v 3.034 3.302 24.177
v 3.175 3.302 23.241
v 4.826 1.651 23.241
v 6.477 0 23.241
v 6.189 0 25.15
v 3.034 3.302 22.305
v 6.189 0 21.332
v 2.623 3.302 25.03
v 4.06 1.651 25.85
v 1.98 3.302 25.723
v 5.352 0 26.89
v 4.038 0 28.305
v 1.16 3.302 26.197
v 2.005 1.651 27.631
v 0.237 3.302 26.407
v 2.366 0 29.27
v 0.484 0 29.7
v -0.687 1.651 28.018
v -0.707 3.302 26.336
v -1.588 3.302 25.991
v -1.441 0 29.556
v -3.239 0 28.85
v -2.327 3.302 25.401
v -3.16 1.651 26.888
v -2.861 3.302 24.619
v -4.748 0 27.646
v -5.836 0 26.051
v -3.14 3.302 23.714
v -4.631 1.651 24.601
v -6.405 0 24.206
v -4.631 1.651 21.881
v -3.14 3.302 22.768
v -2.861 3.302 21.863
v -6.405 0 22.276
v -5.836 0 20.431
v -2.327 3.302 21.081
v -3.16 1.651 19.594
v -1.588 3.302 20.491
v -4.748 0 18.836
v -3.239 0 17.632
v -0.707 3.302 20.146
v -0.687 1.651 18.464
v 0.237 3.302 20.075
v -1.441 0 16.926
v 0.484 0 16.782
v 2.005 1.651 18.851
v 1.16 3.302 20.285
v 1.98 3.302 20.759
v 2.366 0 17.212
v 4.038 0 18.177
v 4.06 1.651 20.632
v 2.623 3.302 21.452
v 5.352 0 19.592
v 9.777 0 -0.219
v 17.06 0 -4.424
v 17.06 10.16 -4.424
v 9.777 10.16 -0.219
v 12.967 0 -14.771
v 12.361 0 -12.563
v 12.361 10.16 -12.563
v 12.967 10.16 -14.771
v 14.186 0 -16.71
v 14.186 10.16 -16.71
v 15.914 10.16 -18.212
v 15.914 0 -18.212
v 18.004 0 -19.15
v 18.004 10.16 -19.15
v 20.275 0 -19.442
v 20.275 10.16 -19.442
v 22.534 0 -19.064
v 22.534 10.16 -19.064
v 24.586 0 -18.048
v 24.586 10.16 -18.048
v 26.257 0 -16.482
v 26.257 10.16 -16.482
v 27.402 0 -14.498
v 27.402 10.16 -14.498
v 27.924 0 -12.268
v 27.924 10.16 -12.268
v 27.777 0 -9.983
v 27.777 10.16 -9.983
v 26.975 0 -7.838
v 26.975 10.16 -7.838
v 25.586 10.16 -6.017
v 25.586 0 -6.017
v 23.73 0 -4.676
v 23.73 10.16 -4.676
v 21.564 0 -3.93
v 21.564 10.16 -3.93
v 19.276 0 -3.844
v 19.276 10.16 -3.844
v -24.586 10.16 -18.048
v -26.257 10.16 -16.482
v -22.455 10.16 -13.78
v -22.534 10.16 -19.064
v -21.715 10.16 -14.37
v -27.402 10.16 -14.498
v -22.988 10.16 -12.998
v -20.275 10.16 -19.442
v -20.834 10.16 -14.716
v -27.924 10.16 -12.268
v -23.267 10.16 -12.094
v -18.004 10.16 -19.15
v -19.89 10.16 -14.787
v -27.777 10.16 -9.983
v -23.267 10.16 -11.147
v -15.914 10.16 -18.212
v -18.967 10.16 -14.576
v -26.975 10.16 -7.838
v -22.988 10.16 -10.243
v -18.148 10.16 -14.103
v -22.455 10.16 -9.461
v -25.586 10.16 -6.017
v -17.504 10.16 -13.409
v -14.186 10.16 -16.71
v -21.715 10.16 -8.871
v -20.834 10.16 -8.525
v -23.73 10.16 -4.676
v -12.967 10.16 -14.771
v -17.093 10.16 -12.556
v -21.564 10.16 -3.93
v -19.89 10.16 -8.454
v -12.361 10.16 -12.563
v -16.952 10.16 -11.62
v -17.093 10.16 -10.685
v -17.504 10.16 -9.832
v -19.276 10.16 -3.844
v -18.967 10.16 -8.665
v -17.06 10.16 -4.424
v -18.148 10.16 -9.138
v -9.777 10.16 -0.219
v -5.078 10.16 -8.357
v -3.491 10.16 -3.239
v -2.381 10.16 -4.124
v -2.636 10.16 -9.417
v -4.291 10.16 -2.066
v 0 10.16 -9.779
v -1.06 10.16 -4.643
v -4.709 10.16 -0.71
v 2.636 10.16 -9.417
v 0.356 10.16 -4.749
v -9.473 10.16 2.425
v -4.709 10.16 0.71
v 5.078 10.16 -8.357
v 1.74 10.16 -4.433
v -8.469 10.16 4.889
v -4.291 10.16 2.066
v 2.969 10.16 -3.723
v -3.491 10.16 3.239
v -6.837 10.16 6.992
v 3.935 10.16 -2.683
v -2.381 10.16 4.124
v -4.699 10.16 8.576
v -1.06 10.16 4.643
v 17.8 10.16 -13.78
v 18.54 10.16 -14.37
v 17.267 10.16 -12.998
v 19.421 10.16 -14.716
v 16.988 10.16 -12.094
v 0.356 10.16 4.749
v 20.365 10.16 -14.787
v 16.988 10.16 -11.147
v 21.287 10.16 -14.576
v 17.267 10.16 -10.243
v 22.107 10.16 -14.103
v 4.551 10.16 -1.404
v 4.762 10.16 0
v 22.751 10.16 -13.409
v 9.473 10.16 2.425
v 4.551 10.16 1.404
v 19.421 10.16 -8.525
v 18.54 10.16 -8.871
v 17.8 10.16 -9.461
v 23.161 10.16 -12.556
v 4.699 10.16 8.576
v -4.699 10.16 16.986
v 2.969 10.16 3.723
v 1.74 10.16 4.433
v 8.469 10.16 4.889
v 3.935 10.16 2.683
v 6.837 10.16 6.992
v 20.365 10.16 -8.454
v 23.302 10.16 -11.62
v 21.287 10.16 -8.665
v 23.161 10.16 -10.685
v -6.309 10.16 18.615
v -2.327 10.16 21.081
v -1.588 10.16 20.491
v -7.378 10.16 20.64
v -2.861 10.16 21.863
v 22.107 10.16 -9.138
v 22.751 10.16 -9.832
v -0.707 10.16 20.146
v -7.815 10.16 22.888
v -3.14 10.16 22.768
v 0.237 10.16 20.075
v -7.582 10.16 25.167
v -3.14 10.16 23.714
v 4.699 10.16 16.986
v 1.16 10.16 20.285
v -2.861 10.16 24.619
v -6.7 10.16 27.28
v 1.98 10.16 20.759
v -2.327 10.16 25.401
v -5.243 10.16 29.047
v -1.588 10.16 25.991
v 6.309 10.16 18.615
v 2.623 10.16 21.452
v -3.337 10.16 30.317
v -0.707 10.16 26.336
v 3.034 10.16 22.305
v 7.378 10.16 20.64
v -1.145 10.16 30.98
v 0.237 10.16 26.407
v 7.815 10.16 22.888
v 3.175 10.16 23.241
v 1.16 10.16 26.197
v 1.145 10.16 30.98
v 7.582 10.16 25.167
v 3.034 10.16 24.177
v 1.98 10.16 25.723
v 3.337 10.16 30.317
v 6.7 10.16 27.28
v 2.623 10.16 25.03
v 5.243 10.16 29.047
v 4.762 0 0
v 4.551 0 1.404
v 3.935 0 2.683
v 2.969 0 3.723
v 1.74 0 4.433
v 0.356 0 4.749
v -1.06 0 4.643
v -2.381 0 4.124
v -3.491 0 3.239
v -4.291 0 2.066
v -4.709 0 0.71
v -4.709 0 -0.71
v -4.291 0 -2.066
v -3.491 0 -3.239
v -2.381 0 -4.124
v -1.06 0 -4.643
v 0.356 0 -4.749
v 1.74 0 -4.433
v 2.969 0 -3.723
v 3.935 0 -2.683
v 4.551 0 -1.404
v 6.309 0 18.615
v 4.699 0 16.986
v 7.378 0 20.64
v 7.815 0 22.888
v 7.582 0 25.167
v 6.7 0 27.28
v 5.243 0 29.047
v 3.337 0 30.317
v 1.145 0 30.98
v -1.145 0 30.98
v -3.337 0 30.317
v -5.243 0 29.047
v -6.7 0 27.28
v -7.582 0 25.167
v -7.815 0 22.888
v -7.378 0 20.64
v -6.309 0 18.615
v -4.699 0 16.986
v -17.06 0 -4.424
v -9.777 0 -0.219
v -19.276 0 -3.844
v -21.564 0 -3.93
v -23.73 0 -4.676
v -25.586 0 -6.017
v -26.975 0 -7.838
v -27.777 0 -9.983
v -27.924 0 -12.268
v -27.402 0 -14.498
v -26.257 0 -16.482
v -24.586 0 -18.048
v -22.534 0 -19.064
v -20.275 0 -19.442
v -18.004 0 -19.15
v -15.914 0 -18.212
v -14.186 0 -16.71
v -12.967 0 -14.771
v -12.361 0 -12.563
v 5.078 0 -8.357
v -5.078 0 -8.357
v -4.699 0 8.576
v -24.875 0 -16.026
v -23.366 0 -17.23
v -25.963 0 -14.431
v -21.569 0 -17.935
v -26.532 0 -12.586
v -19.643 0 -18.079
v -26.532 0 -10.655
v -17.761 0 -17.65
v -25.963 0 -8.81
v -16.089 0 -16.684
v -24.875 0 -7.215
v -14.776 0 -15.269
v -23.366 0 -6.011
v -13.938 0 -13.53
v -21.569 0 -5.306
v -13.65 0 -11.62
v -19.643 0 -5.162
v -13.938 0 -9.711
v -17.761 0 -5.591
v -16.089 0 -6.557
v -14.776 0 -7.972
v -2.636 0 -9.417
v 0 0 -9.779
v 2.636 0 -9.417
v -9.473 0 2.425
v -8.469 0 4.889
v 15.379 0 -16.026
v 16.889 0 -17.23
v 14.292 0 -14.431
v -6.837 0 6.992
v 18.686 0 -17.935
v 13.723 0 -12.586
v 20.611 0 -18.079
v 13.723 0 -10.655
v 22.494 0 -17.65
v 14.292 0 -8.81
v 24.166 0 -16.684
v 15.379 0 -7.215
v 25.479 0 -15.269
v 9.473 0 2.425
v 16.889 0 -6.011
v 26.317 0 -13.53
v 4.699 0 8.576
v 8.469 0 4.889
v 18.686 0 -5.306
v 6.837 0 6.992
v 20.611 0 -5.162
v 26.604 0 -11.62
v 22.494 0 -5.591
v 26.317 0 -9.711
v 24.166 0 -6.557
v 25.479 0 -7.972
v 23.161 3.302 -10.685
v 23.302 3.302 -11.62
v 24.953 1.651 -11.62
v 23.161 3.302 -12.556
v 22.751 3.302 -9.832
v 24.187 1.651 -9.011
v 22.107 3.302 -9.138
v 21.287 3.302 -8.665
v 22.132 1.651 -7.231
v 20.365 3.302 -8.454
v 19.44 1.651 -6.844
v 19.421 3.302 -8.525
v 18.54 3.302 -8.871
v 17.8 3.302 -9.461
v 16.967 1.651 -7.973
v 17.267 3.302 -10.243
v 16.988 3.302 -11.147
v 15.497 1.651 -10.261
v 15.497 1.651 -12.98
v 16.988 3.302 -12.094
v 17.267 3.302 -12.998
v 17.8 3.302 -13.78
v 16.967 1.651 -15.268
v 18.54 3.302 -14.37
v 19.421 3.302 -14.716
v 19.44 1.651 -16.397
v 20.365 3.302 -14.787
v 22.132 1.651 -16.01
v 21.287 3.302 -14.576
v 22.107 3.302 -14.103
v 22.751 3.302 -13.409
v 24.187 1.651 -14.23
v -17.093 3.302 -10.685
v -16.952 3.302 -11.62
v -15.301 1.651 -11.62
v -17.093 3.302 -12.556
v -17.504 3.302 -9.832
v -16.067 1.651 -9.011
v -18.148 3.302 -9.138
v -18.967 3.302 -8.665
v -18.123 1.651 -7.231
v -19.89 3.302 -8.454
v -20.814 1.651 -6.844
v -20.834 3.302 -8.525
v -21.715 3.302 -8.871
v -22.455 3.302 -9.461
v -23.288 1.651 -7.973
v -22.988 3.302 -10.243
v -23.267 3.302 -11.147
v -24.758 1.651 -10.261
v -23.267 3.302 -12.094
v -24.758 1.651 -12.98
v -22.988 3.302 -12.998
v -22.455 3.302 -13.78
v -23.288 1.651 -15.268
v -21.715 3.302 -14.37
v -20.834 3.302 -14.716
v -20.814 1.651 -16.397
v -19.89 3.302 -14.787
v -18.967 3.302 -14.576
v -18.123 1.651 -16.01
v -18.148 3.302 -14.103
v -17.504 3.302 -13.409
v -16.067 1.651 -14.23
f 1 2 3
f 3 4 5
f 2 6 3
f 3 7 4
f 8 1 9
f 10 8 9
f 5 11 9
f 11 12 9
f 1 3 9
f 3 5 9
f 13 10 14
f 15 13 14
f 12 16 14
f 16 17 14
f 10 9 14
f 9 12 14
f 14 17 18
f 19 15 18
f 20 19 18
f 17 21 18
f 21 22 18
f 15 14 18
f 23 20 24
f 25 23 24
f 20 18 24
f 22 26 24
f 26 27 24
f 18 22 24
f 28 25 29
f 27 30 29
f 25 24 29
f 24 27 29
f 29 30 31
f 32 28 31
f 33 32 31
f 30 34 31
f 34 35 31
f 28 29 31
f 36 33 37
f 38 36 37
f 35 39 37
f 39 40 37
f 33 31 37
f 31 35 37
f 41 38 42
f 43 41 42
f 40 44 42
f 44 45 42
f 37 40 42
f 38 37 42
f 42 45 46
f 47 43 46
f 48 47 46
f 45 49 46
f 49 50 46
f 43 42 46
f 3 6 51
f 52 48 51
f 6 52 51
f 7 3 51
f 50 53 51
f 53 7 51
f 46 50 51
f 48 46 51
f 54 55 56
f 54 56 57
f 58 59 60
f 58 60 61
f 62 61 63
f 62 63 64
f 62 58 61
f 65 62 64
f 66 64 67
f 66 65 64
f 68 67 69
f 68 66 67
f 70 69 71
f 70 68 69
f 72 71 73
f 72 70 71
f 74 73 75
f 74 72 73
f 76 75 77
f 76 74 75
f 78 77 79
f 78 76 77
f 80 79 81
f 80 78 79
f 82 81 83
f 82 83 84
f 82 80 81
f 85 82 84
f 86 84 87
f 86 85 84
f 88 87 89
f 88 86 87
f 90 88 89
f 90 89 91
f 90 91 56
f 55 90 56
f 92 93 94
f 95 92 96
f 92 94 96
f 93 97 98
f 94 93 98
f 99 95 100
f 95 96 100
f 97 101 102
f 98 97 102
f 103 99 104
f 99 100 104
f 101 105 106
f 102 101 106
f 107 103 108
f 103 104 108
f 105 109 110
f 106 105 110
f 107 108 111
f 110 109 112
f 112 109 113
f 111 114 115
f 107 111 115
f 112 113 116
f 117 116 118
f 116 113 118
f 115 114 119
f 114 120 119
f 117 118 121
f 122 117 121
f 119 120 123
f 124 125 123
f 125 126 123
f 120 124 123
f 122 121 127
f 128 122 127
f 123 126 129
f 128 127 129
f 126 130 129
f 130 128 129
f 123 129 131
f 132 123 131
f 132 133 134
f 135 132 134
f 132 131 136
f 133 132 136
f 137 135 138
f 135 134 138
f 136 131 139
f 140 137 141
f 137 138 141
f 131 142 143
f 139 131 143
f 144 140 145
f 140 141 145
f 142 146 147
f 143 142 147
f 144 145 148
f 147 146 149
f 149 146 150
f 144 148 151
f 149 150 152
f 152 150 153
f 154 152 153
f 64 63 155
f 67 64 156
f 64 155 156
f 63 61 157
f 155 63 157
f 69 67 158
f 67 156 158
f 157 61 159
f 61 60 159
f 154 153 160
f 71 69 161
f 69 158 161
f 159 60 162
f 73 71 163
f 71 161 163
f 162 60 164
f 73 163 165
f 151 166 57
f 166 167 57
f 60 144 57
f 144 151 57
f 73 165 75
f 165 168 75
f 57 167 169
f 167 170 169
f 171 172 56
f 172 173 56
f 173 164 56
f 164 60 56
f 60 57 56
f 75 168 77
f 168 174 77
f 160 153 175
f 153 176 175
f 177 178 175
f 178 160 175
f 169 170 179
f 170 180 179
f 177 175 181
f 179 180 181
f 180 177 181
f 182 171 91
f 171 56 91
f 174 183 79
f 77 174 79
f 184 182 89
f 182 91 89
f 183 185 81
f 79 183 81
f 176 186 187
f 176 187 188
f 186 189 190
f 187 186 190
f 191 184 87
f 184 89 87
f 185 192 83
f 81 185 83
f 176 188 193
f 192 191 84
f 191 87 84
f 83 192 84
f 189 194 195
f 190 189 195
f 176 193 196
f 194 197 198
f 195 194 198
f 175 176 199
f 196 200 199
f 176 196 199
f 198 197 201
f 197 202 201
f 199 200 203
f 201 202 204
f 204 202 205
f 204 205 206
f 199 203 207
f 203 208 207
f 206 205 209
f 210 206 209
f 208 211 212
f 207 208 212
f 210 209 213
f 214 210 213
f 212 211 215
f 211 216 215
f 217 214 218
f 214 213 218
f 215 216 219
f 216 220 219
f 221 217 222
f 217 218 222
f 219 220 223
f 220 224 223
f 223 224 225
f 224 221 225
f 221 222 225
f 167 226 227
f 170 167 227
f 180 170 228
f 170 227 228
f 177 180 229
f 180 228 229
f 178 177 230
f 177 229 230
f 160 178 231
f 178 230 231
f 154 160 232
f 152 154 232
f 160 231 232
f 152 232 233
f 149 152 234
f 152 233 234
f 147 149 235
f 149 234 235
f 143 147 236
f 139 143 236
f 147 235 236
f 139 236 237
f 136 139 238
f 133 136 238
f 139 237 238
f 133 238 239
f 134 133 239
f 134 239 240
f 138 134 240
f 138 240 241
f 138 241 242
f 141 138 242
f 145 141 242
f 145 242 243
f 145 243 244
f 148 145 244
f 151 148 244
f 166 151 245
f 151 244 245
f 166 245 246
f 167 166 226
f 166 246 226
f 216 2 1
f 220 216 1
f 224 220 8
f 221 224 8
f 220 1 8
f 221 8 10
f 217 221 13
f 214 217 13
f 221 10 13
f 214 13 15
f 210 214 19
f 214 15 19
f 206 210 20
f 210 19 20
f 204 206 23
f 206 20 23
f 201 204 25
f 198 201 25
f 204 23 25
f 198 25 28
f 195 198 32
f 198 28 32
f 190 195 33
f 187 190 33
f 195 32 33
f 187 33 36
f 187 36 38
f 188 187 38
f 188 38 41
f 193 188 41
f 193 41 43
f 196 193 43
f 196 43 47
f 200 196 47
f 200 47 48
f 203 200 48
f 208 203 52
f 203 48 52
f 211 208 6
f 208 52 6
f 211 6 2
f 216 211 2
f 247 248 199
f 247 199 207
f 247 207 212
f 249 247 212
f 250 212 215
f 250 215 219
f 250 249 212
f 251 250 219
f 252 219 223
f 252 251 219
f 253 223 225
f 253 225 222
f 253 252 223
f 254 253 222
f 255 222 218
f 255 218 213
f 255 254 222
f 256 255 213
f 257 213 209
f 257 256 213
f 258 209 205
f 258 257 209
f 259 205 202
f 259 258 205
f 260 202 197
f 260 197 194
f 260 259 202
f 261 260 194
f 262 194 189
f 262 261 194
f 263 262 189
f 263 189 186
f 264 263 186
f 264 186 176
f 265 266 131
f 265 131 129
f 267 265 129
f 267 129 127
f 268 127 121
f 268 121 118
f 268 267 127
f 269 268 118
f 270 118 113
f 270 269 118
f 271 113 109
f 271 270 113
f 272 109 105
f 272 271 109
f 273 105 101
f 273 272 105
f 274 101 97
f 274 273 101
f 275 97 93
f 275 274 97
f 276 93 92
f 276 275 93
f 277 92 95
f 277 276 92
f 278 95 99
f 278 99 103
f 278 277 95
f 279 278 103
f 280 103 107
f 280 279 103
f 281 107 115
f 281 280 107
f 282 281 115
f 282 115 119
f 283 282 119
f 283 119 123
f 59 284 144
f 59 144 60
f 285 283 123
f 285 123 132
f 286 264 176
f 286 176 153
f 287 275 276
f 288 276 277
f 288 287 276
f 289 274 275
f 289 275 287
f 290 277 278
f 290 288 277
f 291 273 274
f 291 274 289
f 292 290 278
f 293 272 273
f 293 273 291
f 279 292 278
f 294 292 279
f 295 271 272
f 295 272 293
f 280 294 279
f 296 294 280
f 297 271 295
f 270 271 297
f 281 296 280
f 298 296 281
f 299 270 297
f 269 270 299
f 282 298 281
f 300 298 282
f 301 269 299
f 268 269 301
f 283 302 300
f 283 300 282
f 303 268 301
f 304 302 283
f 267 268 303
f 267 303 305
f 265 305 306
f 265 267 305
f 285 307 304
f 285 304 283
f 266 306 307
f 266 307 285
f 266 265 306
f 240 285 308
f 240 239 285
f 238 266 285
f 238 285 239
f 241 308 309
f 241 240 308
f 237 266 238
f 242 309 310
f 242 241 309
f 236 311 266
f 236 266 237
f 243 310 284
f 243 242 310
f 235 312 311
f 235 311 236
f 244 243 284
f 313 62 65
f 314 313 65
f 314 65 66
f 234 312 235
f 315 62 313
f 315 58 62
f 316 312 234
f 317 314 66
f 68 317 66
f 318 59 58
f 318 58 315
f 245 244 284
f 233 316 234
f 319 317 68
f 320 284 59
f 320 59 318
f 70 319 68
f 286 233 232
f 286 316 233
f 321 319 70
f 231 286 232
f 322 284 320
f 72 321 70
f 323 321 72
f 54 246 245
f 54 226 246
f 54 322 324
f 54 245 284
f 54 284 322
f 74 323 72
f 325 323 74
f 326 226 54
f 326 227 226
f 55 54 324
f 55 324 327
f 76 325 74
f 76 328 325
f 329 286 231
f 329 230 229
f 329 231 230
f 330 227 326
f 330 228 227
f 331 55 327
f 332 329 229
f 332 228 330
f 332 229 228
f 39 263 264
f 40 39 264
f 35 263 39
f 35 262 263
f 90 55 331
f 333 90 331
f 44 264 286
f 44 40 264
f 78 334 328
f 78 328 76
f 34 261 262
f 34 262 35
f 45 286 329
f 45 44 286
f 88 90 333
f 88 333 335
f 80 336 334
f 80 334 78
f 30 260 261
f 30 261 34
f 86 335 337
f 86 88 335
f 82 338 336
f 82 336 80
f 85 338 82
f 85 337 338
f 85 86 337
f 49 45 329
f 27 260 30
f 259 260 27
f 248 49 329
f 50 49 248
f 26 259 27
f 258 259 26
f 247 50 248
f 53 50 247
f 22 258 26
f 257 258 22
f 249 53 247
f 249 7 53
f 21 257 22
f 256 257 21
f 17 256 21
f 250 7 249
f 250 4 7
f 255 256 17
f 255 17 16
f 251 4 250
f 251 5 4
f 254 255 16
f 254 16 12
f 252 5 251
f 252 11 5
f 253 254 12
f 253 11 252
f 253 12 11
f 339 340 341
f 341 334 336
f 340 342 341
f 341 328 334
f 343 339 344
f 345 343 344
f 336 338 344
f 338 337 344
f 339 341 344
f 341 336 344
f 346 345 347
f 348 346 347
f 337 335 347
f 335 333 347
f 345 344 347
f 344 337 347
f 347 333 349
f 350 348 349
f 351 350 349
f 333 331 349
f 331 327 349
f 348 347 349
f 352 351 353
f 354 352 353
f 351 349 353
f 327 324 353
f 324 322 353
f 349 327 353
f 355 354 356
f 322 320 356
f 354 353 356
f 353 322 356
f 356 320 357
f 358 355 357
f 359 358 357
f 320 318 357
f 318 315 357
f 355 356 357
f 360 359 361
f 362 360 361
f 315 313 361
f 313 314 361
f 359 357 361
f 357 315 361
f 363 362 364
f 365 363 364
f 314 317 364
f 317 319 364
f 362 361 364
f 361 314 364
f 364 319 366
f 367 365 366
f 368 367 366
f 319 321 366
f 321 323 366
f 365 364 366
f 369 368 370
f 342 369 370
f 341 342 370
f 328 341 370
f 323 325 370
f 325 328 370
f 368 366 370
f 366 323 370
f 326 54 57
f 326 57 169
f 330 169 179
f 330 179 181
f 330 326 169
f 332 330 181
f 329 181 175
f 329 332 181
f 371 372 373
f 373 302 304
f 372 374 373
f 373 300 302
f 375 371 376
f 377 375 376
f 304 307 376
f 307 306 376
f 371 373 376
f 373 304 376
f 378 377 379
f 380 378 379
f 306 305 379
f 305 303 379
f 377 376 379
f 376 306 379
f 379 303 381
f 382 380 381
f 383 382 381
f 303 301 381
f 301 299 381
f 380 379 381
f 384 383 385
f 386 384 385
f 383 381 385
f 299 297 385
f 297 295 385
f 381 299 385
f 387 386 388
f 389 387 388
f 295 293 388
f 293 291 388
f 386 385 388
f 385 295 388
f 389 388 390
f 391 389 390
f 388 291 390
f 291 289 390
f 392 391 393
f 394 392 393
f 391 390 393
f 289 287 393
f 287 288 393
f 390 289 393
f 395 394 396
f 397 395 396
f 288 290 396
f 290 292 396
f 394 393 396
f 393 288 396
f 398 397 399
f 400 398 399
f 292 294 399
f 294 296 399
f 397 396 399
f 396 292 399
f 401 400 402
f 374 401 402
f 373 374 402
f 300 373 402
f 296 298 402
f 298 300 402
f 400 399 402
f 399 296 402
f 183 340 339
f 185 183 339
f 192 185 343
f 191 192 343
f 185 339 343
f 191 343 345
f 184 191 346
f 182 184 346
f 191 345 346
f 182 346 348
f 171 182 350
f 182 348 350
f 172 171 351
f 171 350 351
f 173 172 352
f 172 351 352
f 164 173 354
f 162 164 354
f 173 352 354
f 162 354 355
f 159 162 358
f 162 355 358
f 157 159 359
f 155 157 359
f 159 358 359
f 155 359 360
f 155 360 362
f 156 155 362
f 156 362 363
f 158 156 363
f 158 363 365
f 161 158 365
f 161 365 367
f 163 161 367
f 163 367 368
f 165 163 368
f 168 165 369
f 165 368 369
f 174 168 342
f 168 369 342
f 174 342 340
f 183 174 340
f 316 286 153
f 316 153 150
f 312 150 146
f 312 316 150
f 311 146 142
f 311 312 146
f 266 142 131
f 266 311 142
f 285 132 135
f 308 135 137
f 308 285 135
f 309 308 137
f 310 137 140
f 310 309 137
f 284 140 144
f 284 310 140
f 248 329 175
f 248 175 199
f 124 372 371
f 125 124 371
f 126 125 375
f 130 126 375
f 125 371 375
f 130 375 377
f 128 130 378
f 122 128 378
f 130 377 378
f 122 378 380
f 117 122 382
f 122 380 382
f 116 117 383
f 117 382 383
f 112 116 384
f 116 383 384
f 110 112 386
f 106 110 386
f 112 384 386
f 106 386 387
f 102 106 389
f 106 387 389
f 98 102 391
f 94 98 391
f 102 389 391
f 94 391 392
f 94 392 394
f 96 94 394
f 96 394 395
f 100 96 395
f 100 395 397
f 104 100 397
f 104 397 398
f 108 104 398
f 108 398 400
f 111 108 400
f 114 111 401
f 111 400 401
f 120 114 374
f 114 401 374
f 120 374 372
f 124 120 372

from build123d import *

# Parameters (mm, degrees)
F0_R     = 3.175
F0_R_2   = 4.7625
F1_DEPTH = 10.16
F2_SIZE  = 3.302


with BuildPart() as f1:
    # F0 (on Front) → F1 (new body)
    with BuildSketch(Plane.XZ):
        with BuildLine():
            Line((4.699, 8.576027), (4.699, 16.986253))
            ThreePointArc((4.699, 16.986253), (0, 31.0642), (-4.699, 16.986253))
            Line((-4.699, 16.986253), (-4.699, 8.576027))
            ThreePointArc((-4.699, 8.576027), (-8.468862, 4.8895), (-9.776557, -0.21856))
            Line((-9.776557, -0.21856), (-17.060027, -4.423673))
            ThreePointArc((-17.060027, -4.423673), (-26.902386, -15.5321), (-12.361027, -12.56258))
            Line((-12.361027, -12.56258), (-5.077557, -8.357467))
            ThreePointArc((-5.077557, -8.357467), (0, -9.779), (5.077557, -8.357467))
            Line((5.077557, -8.357467), (12.361027, -12.56258))
            ThreePointArc((12.361027, -12.56258), (26.902386, -15.5321), (17.060027, -4.423673))
            Line((17.060027, -4.423673), (9.776557, -0.21856))
            ThreePointArc((9.776557, -0.21856), (8.468862, 4.8895), (4.699, 8.576027))
        make_face()
        with Locations((-20.127296, -11.6205)):
            Circle(F0_R, mode=Mode.SUBTRACT)
        Circle(F0_R_2, mode=Mode.SUBTRACT)
        with Locations((20.127296, -11.6205)):
            Circle(F0_R, mode=Mode.SUBTRACT)
        with Locations((0, 23.241)):
            Circle(F0_R, mode=Mode.SUBTRACT)
    extrude(amount=-F1_DEPTH)

    # F2
    f2_edges = [f1.edges().sort_by_distance(p)[0] for p in [
        (-3.175, 0, 23.241),
        (-23.302296, 0, -11.6205),
        (16.952296, 0, -11.6205),
    ]]
    chamfer(f2_edges, length=F2_SIZE)


solid = f1.part
